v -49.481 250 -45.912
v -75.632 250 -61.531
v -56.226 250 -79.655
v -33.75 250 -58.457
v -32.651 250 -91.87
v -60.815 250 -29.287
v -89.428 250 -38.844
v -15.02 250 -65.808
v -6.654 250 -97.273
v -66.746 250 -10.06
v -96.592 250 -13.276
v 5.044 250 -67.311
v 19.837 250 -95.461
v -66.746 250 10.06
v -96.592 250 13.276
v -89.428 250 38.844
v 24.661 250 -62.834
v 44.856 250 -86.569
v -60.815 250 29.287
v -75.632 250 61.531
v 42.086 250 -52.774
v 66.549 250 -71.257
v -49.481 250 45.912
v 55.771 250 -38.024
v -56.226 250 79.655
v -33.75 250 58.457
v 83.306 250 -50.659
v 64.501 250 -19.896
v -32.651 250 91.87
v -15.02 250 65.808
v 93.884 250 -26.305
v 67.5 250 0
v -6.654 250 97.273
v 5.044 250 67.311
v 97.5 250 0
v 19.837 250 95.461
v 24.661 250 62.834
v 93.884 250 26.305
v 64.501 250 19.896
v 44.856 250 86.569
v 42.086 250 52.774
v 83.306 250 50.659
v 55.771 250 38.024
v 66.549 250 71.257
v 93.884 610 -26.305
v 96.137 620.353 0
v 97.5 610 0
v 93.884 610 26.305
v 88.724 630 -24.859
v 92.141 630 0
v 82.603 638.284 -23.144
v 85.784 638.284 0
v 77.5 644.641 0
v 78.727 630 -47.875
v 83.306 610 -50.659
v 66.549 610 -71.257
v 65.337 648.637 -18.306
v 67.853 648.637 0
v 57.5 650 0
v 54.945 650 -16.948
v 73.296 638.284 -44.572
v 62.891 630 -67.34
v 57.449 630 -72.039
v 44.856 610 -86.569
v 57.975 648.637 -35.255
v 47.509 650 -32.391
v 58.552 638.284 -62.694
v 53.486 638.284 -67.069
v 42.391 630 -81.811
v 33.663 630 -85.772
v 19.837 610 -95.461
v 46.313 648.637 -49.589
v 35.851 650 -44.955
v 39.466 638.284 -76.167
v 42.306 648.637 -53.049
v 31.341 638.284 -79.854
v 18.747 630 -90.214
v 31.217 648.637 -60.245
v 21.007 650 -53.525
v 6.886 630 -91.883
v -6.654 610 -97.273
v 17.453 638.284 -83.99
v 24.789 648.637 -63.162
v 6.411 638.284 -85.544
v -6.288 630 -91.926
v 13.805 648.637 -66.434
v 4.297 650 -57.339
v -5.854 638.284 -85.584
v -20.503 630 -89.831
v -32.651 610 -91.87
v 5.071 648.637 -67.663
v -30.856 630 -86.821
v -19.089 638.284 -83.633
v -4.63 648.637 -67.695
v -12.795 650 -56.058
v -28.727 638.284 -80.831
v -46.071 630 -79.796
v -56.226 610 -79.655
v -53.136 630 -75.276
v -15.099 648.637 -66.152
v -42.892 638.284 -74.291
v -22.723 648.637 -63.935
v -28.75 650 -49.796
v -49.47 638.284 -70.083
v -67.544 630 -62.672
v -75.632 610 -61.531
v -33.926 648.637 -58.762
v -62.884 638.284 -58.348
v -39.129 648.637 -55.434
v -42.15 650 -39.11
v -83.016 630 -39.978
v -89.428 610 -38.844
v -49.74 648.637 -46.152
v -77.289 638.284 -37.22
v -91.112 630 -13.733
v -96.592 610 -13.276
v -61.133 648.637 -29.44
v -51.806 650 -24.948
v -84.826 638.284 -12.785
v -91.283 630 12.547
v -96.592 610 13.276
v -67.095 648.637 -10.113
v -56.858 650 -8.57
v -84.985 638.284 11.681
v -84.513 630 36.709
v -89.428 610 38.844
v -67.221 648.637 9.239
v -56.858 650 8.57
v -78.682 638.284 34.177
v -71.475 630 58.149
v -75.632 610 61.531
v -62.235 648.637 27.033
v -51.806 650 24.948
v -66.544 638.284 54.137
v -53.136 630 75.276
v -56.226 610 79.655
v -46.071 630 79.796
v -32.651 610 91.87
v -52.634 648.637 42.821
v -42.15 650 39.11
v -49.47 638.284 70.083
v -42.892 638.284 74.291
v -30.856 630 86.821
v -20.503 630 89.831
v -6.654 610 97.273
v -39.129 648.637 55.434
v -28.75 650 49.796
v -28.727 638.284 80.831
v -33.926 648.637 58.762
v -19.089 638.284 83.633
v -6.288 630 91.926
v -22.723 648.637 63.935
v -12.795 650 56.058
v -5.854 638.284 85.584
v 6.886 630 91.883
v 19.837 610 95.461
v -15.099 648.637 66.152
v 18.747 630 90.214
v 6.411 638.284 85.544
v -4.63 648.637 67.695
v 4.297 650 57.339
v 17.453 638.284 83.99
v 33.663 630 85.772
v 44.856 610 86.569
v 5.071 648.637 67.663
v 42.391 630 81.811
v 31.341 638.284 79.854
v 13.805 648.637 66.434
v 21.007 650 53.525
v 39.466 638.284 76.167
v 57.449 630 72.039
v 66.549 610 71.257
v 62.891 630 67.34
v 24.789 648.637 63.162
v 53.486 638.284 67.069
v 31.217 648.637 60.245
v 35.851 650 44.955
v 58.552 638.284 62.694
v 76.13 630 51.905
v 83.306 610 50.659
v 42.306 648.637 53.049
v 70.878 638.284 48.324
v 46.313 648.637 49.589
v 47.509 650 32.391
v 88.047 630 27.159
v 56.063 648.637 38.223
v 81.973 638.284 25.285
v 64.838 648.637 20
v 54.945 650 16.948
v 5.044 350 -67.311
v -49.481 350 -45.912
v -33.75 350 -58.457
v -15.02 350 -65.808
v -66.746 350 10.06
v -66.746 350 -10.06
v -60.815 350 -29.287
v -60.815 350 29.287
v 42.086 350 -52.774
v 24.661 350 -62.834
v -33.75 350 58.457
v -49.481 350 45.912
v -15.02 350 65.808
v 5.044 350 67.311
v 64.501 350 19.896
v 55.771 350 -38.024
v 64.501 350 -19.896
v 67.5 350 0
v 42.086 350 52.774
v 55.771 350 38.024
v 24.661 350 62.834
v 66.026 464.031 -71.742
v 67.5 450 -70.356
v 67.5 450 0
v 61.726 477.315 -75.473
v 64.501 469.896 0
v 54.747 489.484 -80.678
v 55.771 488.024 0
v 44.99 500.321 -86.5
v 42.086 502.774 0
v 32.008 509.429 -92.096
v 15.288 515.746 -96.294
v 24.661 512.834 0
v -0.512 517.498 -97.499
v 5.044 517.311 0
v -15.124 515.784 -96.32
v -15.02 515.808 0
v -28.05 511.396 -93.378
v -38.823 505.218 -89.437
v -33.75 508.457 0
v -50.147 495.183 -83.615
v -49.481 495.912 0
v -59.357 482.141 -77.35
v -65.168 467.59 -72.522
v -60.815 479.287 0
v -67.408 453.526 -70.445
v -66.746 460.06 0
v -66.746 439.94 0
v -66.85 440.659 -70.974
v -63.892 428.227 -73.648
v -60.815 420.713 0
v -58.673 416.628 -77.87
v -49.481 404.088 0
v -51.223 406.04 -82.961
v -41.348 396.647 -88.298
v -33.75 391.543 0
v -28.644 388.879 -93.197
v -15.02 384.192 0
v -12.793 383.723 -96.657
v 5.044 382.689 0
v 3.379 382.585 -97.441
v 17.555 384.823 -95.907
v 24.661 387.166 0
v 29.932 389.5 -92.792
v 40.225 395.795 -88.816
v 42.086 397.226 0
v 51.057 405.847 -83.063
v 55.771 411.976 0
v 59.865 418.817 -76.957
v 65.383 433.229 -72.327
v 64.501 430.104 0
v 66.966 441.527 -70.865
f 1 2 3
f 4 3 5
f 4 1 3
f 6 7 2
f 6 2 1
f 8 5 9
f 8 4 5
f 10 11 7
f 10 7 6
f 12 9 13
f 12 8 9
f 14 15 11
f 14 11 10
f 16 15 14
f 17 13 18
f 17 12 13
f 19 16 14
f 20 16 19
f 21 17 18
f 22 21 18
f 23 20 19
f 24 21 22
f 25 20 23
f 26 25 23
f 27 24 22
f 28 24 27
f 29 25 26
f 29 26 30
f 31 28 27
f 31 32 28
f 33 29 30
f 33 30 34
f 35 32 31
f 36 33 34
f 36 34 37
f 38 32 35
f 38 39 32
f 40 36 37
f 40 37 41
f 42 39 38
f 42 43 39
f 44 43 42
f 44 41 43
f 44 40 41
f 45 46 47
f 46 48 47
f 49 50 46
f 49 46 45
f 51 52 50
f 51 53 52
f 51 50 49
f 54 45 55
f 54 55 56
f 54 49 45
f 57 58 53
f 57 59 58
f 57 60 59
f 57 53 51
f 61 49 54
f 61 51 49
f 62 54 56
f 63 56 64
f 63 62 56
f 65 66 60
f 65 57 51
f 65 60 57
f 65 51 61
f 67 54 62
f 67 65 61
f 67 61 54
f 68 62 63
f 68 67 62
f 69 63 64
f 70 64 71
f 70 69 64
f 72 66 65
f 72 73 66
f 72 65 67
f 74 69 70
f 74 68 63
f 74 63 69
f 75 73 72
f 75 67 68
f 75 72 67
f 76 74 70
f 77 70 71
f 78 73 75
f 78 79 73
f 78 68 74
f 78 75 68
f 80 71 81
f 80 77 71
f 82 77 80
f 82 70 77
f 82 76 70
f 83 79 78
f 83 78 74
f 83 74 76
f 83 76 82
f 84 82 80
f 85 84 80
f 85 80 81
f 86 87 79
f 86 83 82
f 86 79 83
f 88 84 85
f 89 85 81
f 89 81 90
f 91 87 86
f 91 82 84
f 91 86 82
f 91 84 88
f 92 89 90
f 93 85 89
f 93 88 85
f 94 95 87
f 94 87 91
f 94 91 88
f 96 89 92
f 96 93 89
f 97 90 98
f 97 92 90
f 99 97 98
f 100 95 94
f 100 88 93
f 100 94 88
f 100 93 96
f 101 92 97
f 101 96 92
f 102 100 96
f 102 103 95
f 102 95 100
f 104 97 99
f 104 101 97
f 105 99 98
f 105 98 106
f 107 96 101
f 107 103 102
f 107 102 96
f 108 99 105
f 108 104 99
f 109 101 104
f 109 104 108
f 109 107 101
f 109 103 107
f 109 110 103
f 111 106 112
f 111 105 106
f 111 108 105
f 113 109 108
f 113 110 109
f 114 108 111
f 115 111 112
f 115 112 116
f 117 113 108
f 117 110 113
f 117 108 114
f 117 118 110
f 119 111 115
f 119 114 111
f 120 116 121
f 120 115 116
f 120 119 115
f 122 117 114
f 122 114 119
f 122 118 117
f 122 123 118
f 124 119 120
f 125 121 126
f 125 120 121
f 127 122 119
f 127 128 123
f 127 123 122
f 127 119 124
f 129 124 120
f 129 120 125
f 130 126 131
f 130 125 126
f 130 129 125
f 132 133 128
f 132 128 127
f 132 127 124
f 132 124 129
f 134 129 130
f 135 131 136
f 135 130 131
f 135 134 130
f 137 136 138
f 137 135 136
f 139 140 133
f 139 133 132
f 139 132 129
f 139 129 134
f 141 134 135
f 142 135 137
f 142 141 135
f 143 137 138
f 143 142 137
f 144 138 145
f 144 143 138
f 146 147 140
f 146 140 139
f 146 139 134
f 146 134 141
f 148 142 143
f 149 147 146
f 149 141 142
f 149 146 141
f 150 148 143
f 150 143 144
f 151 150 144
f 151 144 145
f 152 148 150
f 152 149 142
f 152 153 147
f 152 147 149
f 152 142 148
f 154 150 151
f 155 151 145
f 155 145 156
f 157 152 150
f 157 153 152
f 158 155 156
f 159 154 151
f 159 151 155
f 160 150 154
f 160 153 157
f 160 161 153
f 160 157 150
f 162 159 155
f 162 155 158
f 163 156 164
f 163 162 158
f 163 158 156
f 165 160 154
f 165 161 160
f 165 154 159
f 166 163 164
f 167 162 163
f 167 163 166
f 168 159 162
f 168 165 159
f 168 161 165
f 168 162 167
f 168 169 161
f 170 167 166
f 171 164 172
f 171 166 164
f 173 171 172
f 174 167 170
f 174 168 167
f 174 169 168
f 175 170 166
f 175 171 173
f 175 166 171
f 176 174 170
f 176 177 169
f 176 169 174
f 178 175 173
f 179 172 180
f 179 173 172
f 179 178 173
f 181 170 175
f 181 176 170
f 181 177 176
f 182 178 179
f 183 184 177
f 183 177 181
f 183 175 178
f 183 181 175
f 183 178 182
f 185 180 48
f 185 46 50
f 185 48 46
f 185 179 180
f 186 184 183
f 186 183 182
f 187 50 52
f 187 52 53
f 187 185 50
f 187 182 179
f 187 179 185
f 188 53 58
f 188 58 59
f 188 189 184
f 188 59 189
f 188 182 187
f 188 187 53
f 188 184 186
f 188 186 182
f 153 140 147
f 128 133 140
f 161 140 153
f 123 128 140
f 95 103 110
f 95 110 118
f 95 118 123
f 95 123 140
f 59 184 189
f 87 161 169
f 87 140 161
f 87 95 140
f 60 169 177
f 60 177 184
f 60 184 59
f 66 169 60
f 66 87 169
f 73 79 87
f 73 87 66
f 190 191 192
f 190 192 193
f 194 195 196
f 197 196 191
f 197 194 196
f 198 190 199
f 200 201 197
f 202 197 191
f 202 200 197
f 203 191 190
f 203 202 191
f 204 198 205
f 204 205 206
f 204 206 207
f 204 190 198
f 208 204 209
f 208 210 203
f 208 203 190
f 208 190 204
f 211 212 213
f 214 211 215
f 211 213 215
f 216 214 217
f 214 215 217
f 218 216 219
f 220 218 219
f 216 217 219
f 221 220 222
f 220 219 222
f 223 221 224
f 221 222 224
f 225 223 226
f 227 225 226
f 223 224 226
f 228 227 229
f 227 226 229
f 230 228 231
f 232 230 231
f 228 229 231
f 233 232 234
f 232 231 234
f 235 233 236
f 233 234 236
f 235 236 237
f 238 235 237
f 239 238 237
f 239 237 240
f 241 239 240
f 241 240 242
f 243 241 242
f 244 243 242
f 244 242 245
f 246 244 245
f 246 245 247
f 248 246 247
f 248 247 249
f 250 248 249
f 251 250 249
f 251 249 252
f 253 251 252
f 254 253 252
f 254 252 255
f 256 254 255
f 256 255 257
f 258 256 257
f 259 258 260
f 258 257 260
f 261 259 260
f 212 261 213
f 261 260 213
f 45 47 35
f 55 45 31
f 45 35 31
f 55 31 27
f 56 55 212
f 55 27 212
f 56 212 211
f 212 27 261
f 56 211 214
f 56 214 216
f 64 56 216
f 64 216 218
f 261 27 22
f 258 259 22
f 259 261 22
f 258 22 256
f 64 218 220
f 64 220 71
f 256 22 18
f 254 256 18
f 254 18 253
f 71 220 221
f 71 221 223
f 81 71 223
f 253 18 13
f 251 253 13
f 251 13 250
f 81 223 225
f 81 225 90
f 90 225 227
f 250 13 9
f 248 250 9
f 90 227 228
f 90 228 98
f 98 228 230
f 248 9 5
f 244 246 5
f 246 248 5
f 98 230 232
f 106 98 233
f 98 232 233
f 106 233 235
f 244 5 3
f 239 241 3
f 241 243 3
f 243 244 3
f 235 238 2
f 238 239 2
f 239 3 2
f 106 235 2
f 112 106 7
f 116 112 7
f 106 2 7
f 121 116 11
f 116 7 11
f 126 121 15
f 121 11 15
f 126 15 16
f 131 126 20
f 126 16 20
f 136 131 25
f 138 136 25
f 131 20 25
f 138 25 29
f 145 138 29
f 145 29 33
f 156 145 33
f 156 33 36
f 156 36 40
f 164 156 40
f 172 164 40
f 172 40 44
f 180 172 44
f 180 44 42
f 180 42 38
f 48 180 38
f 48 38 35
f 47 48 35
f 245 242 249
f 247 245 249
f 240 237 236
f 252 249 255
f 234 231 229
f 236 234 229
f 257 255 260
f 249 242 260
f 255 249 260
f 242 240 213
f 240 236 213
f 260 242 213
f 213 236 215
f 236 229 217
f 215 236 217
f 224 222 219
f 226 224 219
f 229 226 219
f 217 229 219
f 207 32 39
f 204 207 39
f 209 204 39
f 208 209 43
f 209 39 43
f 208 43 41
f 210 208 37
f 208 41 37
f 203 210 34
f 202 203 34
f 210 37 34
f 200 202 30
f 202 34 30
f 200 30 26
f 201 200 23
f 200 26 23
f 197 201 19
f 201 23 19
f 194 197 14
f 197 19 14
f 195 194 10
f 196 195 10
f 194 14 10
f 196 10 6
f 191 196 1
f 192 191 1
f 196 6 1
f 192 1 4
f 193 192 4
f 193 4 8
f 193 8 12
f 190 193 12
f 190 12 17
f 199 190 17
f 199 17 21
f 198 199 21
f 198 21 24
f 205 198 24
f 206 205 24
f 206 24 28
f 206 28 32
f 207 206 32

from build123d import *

# Parameters (mm, degrees)
SKETCH1_R           = 97.5
BOSS_EXTRUDE1_DEPTH = 650
SKETCH2_R           = 97.5
SKETCH2_R_2         = 67.5
CUT_EXTRUDE4_DEPTH  = 250
SKETCH4_R           = 67.5
CUT_EXTRUDE3_DEPTH  = 98.5
FILLET1_R           = 40
SKETCH5_R           = 67.5
CUT_EXTRUDE5_DEPTH  = 350


with BuildPart() as part:
    # Sketch1 → Boss-Extrude1 (new body)
    with BuildSketch(Plane(origin=(0, 0, 0), x_dir=(1, 0, 0), z_dir=(0, 1, 0))):
        Circle(SKETCH1_R)
    extrude(amount=BOSS_EXTRUDE1_DEPTH)

    # Sketch2 → Cut-Extrude4 (cut)
    with BuildSketch(Plane.XZ):
        Circle(SKETCH2_R)
        Circle(SKETCH2_R_2, mode=Mode.SUBTRACT)
    extrude(amount=-CUT_EXTRUDE4_DEPTH, mode=Mode.SUBTRACT)

    # Sketch4 → Cut-Extrude3 (cut, through all)
    with BuildSketch(Plane.XY):
        with Locations((0, 450)):
            Circle(SKETCH4_R)
    extrude(amount=-CUT_EXTRUDE3_DEPTH, mode=Mode.SUBTRACT)

    # Fillet1
    fillet1_edges = [part.edges().sort_by_distance(p)[0] for p in [
        (-97.5, 650, 0),
    ]]
    fillet(fillet1_edges, radius=FILLET1_R)

    # Sketch5 → Cut-Extrude5 (cut)
    with BuildSketch(Plane.XZ):
        Circle(SKETCH5_R)
    extrude(amount=-CUT_EXTRUDE5_DEPTH, mode=Mode.SUBTRACT)


solid = part.part
